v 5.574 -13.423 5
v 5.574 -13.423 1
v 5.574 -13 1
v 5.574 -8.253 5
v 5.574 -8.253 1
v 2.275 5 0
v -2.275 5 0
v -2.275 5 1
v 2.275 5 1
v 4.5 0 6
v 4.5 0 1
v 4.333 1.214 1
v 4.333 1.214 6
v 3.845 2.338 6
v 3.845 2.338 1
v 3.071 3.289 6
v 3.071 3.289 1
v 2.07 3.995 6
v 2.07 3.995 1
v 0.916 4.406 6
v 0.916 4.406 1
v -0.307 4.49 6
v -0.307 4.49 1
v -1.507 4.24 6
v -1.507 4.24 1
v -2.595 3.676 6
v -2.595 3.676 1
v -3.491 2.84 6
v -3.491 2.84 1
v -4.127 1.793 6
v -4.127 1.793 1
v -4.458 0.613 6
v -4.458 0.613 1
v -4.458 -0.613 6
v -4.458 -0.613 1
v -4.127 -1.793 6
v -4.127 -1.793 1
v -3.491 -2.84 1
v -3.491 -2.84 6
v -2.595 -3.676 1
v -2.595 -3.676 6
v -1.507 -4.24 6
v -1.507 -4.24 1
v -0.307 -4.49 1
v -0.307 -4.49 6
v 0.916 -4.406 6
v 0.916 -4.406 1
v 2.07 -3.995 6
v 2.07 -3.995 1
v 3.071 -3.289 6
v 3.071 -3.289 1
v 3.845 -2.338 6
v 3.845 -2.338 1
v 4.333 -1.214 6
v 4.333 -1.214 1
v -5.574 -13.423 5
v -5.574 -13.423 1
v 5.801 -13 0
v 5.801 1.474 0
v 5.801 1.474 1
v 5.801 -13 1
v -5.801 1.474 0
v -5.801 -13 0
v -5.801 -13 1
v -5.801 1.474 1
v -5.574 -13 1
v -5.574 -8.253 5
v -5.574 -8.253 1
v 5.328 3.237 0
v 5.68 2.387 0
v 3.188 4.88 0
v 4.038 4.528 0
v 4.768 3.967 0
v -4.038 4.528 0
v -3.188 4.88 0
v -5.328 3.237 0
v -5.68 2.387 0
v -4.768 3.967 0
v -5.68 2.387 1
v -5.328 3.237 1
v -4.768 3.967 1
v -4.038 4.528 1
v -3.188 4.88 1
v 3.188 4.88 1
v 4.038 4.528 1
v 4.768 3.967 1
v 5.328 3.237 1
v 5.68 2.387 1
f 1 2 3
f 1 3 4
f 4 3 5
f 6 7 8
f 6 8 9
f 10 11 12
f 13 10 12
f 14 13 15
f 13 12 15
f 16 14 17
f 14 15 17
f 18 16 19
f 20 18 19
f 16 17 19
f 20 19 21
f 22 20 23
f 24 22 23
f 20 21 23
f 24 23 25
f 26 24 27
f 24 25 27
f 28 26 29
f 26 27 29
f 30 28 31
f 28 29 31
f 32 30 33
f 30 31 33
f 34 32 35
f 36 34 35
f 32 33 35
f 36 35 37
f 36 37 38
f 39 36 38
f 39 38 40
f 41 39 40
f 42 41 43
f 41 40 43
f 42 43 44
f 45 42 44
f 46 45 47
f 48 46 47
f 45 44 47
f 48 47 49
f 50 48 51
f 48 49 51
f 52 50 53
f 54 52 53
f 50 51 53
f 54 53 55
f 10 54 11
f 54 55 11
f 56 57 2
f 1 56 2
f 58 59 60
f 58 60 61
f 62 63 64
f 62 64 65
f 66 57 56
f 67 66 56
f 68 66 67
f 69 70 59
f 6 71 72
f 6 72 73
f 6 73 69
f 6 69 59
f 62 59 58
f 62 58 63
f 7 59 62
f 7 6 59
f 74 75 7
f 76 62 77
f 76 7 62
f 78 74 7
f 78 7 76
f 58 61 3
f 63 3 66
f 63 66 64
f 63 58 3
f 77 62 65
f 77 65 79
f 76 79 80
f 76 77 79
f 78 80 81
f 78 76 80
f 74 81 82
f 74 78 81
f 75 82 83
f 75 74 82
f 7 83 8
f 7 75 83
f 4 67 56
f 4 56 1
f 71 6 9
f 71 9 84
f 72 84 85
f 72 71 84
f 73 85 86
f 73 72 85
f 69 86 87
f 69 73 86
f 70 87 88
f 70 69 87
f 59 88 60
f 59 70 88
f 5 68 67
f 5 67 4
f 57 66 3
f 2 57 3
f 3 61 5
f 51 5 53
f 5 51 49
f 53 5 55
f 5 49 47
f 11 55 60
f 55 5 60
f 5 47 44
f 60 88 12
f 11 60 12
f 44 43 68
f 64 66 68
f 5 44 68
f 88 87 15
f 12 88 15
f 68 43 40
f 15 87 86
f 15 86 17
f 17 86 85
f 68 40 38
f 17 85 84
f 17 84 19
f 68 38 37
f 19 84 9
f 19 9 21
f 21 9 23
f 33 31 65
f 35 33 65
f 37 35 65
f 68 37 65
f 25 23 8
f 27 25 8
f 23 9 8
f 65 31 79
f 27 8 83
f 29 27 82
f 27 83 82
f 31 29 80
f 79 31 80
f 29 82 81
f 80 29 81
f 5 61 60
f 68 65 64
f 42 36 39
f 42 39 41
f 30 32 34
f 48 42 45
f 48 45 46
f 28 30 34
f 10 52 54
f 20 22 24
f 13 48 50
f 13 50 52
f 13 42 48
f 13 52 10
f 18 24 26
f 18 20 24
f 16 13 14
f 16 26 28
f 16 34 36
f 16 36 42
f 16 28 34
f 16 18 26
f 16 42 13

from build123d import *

# Parameters (mm, degrees)
EXTRUDE_1_DEPTH = 1
SKETCH_2_R      = 4.5
EXTRUDE_2_DEPTH = 5
SKETCH_3_W      = 11.148375858
SKETCH_3_H      = 5.169406936
EXTRUDE_3_DEPTH = 4


with BuildPart() as part:
    # 草图1 → 凸台-拉伸1 (new body)
    with BuildSketch(Plane.XY):
        with BuildLine():
            Line((-2.275007411, 5), (2.275007411, 5))
            ThreePointArc((2.275007411, 5), (4.76799478, 3.967370821), (5.800623959, 1.474383452))
            Line((5.800623959, 1.474383452), (5.800623959, -13))
            Line((5.800623959, -13), (-5.800623959, -13))
            Line((-5.800623959, -13), (-5.800623959, 1.474383452))
            ThreePointArc((-5.800623959, 1.474383452), (-4.76799478, 3.967370821), (-2.275007411, 5))
        make_face()
    extrude(amount=EXTRUDE_1_DEPTH)

    # 草图2 → 凸台-拉伸2 (add)
    with BuildSketch(Plane.XY.offset(1)):
        Circle(SKETCH_2_R)
    extrude(amount=EXTRUDE_2_DEPTH)

    # 草图3 → 凸台-拉伸3 (add)
    with BuildSketch(Plane.XY.offset(1)):
        with Locations((0, -10.837924987)):
            Rectangle(SKETCH_3_W, SKETCH_3_H)
    extrude(amount=EXTRUDE_3_DEPTH)


solid = part.part
